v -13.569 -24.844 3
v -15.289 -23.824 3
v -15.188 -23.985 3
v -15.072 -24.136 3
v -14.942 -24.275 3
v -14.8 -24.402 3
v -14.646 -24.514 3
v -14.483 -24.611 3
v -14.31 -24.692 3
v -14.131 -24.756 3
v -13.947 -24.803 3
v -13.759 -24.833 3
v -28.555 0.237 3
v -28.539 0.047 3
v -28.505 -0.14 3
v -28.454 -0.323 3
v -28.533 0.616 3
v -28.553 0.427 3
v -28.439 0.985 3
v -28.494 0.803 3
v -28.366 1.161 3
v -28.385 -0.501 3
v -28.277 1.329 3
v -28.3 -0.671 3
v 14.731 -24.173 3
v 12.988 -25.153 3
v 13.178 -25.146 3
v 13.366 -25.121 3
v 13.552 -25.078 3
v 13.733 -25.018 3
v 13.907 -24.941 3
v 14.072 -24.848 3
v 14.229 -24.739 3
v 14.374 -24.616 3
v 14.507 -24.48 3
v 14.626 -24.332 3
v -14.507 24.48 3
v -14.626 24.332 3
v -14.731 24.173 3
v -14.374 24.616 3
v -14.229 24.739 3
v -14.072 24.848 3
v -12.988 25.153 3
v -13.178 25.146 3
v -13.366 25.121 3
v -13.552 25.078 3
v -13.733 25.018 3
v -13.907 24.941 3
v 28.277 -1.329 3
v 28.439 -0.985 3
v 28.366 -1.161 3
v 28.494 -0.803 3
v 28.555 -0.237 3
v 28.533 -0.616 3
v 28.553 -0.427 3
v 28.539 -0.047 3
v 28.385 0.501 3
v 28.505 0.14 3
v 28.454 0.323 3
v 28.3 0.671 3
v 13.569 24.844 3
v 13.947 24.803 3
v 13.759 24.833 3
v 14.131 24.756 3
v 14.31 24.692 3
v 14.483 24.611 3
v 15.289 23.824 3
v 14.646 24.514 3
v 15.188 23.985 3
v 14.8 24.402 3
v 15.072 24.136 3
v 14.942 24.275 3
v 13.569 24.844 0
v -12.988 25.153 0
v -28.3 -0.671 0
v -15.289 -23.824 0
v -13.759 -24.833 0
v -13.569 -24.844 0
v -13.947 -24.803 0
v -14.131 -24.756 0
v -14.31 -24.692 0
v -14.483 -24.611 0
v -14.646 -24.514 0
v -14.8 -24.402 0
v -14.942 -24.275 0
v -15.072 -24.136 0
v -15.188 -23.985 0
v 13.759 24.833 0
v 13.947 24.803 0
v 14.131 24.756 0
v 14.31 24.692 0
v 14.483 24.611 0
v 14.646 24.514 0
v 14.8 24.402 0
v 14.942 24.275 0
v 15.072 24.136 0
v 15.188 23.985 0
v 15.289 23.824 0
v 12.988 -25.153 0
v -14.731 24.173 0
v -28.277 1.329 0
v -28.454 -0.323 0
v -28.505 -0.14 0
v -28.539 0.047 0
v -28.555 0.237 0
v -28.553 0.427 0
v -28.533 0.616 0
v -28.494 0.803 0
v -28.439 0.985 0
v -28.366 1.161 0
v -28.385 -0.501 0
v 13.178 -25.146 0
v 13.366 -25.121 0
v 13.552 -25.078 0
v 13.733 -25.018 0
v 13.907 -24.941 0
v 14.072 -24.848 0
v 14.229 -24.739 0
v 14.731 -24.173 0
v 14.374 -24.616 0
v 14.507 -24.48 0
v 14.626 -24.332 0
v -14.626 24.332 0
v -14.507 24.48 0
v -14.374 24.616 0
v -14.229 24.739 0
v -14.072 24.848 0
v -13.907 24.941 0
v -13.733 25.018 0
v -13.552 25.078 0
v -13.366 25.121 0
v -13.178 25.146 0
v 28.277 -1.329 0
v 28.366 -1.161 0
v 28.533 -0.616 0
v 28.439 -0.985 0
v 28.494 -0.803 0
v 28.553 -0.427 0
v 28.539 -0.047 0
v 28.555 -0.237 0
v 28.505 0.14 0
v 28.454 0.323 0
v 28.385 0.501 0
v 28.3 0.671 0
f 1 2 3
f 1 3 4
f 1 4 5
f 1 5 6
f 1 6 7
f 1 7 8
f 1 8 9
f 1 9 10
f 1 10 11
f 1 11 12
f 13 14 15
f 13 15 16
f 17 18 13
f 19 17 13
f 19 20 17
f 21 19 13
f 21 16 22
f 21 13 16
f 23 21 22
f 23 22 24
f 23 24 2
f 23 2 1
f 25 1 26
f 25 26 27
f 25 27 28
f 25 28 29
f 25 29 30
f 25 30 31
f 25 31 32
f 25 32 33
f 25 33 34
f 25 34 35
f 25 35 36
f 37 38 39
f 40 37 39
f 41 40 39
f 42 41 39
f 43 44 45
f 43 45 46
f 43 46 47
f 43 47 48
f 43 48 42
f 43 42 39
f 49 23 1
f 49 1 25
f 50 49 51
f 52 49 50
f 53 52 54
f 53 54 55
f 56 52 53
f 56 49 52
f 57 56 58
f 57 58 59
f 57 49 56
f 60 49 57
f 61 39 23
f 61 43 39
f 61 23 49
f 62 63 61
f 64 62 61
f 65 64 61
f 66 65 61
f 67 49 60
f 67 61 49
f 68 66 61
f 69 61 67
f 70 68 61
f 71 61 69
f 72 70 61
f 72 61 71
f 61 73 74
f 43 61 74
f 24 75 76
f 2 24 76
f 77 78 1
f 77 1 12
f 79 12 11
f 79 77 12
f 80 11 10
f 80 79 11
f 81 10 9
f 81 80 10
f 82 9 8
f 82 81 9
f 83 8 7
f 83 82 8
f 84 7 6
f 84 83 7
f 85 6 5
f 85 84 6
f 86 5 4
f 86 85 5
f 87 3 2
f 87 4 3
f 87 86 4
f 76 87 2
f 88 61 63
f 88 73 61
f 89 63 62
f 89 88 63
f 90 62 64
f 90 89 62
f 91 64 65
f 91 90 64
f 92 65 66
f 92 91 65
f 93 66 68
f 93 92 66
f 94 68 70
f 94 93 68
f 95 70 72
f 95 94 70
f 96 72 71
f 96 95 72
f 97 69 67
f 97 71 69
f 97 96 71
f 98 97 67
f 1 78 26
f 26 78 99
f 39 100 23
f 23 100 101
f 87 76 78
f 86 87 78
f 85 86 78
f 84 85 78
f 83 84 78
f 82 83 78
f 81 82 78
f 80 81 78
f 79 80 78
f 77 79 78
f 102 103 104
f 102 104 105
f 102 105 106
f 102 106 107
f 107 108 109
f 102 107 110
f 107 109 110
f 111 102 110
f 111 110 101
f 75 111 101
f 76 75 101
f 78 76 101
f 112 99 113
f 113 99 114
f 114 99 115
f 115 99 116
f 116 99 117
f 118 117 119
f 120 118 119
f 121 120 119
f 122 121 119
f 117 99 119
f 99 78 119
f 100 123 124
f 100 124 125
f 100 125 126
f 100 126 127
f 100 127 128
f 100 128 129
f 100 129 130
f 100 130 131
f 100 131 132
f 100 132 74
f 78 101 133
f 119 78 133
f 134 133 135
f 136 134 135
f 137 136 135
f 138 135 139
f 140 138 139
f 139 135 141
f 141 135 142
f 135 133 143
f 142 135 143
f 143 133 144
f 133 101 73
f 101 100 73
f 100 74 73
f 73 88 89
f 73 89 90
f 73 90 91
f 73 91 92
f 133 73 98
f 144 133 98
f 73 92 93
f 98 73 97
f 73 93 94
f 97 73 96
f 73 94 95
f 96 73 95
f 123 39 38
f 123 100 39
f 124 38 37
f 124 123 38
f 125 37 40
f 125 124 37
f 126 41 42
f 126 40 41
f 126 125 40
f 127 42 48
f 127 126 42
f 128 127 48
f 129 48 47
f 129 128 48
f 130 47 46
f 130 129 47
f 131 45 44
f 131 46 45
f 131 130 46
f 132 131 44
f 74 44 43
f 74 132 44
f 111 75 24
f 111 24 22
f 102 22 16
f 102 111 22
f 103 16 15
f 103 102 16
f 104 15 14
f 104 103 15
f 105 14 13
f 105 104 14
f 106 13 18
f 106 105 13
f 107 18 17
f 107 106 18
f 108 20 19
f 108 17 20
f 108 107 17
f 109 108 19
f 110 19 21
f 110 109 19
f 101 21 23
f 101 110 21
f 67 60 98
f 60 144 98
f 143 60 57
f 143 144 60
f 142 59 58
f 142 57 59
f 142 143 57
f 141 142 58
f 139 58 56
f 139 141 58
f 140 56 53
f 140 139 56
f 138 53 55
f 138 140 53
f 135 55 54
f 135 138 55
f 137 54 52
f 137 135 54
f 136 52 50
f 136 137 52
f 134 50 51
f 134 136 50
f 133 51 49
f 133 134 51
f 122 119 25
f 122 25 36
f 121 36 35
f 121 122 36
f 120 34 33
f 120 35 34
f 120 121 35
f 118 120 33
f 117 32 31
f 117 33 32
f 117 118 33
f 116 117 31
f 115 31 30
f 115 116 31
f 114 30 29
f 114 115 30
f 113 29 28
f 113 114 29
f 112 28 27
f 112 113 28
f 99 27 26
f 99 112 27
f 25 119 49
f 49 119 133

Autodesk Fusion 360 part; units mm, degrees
sketch "Sketch1" plane through (0, 0, 0) normal (0, 0, 1) x (1, 0, 0)
  line L0 (13.5687, 24.844) -> (-12.9876, 25.1527)
  line L1 (-14.7311, 24.1729) -> (-28.2766, 1.3288)
  line L2 (-28.2999, -0.6711) -> (-15.2891, -23.8239)
  line L3 (-13.5687, -24.844) -> (12.9876, -25.1527)
  line L4 (14.7311, -24.1729) -> (28.2766, -1.3288)
  line L5 (28.2999, 0.6711) -> (15.2891, 23.8239)
  arc A0 (-12.9876, 25.1527) -> (-14.7311, 24.1729) centre (-13.0108, 23.1528) ccw
  arc A1 (15.2891, 23.8239) -> (13.5687, 24.844) centre (13.5455, 22.8441) ccw
  arc A2 (28.2766, -1.3288) -> (28.2999, 0.6711) centre (26.5563, -0.3087) ccw
  arc A3 (12.9876, -25.1527) -> (14.7311, -24.1729) centre (13.0108, -23.1528) ccw
  arc A4 (-15.2891, -23.8239) -> (-13.5687, -24.844) centre (-13.5455, -22.8441) ccw
  arc A5 (-28.2766, 1.3288) -> (-28.2999, -0.6711) centre (-26.5563, 0.3087) ccw
  point P0 (-12.5, 7.2169)
  dimension "d1" = 25
  dimension "d7" = 2
  dimension "d8" = 2
  dimension "d9" = 2
  dimension "d10" = 2
  dimension "d11" = 2
  dimension "d12" = 2
extrude "Extrude1" add sketch "Sketch1" along normal blind 3
